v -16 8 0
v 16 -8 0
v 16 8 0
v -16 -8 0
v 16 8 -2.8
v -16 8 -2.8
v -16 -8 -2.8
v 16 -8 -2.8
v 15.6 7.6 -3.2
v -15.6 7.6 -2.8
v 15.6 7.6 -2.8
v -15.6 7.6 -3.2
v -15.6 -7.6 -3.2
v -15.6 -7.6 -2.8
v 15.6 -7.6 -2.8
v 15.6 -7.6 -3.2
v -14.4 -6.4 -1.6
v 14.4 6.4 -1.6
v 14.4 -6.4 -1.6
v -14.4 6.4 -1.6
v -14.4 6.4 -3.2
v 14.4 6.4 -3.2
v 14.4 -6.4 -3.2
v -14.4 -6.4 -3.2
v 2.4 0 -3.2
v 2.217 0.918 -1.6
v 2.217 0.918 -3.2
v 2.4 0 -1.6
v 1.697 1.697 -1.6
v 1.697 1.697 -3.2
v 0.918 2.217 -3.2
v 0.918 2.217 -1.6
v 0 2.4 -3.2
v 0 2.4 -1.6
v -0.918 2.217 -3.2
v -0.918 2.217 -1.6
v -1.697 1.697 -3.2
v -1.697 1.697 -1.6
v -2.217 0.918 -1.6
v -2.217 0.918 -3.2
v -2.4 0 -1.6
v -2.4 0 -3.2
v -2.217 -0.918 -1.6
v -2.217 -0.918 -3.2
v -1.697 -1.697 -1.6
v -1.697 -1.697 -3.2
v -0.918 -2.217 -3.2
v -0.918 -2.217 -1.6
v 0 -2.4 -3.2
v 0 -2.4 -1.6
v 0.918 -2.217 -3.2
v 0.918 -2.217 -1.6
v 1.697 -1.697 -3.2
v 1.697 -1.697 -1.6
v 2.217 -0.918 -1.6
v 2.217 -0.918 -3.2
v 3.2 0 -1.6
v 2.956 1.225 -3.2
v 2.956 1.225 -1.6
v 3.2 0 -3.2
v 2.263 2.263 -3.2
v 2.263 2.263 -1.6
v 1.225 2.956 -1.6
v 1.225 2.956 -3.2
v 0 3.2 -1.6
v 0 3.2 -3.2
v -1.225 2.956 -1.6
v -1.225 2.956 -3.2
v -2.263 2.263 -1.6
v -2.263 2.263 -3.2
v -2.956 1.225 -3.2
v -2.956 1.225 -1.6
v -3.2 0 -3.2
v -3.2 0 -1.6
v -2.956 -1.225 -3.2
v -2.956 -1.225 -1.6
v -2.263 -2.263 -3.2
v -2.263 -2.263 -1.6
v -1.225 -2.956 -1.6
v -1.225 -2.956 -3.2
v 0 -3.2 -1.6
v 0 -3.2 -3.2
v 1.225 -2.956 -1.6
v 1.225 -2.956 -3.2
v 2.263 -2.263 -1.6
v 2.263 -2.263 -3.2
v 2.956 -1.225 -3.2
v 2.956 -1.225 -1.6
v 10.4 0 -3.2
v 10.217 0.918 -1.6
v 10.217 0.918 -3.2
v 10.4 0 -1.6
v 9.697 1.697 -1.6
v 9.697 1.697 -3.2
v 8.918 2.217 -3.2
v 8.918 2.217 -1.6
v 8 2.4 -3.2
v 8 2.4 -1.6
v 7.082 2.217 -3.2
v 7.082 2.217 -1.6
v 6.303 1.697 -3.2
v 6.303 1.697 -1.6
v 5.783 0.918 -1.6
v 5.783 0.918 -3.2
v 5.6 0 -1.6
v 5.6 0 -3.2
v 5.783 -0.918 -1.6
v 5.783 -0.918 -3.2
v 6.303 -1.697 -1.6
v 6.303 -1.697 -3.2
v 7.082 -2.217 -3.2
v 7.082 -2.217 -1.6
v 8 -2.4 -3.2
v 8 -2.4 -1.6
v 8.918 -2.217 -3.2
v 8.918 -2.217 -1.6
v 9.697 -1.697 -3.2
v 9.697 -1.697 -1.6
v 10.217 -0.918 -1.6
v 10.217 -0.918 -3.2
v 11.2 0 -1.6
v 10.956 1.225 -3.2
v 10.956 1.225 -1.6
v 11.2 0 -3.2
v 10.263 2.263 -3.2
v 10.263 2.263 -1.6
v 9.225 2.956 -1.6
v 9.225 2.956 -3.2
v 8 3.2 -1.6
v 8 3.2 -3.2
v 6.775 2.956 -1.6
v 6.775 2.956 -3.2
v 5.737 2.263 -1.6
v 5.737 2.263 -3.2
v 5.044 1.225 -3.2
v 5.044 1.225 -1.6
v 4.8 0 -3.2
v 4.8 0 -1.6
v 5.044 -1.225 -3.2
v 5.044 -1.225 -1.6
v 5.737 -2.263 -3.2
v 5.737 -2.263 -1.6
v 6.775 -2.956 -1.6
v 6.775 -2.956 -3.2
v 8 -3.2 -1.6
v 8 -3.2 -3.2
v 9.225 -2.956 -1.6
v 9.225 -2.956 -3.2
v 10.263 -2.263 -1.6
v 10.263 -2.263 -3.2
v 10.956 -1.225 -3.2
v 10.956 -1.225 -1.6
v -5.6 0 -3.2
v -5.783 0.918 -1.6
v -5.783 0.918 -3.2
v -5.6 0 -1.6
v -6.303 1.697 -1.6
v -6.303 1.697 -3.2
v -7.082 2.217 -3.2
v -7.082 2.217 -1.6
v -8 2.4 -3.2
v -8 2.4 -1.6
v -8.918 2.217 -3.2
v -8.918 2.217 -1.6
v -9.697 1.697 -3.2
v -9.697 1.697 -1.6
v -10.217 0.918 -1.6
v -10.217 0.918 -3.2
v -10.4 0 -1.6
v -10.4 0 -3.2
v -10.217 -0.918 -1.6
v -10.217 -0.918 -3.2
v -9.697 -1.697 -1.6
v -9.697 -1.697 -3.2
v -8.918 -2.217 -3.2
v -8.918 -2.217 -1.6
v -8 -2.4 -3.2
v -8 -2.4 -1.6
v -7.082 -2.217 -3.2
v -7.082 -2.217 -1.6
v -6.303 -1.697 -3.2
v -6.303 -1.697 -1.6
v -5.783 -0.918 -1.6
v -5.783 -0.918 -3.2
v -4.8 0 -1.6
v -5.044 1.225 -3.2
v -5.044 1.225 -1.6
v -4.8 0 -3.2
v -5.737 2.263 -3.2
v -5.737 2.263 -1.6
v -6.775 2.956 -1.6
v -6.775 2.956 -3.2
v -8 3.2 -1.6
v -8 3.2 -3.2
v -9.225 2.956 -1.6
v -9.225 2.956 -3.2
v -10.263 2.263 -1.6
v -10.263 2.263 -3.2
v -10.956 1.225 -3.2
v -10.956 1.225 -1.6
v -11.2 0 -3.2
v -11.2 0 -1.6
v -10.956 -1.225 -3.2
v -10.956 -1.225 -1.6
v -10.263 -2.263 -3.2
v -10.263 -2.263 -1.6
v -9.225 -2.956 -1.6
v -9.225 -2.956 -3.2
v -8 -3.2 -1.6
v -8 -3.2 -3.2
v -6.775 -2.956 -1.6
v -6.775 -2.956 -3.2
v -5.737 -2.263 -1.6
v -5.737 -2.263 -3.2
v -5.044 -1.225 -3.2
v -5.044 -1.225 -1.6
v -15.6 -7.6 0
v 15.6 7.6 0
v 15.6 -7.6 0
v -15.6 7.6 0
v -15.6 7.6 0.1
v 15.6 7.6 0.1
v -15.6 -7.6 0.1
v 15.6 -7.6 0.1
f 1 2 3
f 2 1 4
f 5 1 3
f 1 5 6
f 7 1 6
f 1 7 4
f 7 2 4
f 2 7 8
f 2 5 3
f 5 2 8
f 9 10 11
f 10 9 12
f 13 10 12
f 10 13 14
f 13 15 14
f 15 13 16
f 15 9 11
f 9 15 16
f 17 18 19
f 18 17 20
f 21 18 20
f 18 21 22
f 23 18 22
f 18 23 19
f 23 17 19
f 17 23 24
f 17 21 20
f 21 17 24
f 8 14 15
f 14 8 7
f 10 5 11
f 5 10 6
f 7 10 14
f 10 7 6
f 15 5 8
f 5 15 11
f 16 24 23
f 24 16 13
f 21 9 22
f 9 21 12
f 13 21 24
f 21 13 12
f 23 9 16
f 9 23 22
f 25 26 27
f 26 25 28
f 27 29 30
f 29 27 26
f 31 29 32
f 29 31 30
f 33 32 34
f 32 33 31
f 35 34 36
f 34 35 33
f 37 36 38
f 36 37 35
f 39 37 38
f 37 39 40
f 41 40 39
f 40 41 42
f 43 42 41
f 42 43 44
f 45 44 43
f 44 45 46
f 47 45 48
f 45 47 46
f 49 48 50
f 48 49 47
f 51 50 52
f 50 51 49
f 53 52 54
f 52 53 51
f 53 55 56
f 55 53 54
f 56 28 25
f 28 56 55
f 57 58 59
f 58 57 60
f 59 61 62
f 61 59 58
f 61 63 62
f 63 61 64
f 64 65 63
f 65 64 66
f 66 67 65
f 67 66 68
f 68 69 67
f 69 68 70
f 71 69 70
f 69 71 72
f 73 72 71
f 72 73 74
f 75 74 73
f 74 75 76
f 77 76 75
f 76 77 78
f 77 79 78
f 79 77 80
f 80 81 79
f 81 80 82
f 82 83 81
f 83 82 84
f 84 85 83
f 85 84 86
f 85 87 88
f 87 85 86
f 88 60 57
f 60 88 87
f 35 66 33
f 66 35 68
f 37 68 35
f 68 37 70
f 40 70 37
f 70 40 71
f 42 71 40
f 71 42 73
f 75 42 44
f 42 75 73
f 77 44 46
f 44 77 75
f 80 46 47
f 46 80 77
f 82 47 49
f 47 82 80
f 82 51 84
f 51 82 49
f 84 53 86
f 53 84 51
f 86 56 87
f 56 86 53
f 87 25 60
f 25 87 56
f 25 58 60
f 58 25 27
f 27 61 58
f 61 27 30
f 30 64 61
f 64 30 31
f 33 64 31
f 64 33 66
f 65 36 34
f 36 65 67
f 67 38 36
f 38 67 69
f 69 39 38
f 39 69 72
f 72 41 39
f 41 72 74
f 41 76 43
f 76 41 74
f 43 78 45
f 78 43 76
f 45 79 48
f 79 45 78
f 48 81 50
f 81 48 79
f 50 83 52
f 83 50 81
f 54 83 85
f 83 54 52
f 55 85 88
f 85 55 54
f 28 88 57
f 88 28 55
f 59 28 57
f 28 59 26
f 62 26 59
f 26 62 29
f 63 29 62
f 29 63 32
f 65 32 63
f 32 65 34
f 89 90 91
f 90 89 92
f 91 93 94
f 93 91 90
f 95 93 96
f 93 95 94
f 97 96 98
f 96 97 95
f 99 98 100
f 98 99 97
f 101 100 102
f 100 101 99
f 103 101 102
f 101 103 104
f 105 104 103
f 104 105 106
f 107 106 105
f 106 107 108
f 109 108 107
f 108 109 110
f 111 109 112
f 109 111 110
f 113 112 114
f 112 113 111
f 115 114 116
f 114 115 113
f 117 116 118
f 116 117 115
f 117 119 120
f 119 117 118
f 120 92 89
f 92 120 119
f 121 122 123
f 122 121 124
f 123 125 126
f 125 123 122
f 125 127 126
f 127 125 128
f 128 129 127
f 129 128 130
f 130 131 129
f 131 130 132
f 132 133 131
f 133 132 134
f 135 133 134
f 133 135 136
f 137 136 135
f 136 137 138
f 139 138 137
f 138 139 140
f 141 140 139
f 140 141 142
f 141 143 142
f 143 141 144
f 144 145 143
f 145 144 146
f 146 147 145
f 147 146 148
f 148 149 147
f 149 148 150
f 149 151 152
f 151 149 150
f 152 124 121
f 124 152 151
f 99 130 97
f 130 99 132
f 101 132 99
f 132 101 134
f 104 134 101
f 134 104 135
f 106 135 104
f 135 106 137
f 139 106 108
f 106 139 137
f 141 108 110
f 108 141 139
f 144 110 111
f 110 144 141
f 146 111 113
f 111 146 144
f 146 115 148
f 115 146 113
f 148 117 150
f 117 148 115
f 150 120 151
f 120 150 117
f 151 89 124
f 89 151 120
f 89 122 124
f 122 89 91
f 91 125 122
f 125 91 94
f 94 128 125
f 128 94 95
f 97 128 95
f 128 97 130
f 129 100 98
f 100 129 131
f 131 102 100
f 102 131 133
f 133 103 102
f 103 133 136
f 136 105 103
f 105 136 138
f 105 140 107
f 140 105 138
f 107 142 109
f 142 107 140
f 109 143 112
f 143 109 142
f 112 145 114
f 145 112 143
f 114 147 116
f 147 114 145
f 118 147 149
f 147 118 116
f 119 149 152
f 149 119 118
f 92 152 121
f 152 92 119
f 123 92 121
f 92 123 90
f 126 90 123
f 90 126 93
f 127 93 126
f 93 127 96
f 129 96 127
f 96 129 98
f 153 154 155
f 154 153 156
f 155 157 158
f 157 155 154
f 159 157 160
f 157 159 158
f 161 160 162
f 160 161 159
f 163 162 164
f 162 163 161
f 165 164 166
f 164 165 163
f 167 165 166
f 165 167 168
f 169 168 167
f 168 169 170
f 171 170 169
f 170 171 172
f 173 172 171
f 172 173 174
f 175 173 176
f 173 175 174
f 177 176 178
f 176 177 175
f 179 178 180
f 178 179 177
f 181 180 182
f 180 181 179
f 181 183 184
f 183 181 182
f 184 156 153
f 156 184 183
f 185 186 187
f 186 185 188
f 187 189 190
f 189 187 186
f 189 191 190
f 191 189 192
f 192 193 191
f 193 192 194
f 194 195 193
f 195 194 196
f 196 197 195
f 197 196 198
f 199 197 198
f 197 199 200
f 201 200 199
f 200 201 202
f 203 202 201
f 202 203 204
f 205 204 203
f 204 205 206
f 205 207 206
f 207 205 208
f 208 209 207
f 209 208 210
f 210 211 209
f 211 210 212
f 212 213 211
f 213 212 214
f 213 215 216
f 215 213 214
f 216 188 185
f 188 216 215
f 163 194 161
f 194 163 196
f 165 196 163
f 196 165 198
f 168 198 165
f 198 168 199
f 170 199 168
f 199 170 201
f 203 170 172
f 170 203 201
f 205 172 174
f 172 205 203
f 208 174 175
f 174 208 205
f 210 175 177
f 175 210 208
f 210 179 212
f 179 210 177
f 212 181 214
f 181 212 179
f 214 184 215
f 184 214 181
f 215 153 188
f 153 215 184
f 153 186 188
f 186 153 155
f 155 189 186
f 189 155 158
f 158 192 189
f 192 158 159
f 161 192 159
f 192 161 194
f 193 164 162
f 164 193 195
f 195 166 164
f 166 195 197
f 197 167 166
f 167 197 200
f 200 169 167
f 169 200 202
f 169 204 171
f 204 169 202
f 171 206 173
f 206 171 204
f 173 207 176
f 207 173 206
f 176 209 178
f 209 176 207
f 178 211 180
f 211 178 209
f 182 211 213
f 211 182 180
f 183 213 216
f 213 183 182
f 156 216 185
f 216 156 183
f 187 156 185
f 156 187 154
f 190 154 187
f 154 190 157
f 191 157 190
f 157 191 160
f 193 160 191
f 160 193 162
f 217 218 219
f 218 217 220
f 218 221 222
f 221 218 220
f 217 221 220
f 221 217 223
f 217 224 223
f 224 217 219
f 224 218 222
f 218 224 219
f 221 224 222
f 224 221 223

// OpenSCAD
// file: ../p/4-4ring3.scad
use <../lib.scad>
$fa=1; $fs=0.2;
function ldraw_lib__4_4ring3(realsolid=false) = [
// 0 Ring  3 x 1.0
// 0 Name: 4-4ring3.dat
// 0 Author: James Jessiman
// 0 !LDRAW_ORG Primitive UPDATE 2009-01
// 0 !LICENSE Licensed under CC BY 2.0 and CC BY 4.0 : see CAreadme.txt
// 
// 0 BFC CERTIFY CCW
  [0,"BFC","CERTIFY"],
  [0,"BFC","CCW"],
// 
// 0 !HISTORY 1998-12-15 [PTadmin] Official Update 1998-10
// 0 !HISTORY 2002-04-05 [hafhead] Added BFC statement
// 0 !HISTORY 2002-04-25 [PTadmin] Official Update 2002-02
// 0 !HISTORY 2007-06-24 [PTadmin] Header formatted for Contributor Agreement
// 0 !HISTORY 2008-07-01 [PTadmin] Official Update 2008-01
// 0 !HISTORY 2008-08-26 [cwdee] Switch polygon winding and rename
// 0 !HISTORY 2009-05-02 [PTadmin] Official Update 2009-01
// 
// 
// 4 16 -1.5308 0 3.6956 -1.1481 0 2.7717 0 0 3 0 0 4
  [4,16,-1.5308,0,3.6956,-1.1481,0,2.7717,0,0,3,0,0,4],
// 4 16 -2.8284 0 2.8284 -2.1213 0 2.1213 -1.1481 0 2.7717 -1.5308 0 3.6956
  [4,16,-2.8284,0,2.8284,-2.1213,0,2.1213,-1.1481,0,2.7717,-1.5308,0,3.6956],
// 4 16 -3.6956 0 1.5308 -2.7717 0 1.1481 -2.1213 0 2.1213 -2.8284 0 2.8284
  [4,16,-3.6956,0,1.5308,-2.7717,0,1.1481,-2.1213,0,2.1213,-2.8284,0,2.8284],
// 4 16 -4 0 0 -3 0 0 -2.7717 0 1.1481 -3.6956 0 1.5308
  [4,16,-4,0,0,-3,0,0,-2.7717,0,1.1481,-3.6956,0,1.5308],
// 4 16 -3.6956 0 -1.5308 -2.7717 0 -1.1481 -3 0 0 -4 0 0
  [4,16,-3.6956,0,-1.5308,-2.7717,0,-1.1481,-3,0,0,-4,0,0],
// 4 16 -2.8284 0 -2.8284 -2.1213 0 -2.1213 -2.7717 0 -1.1481 -3.6956 0 -1.5308
  [4,16,-2.8284,0,-2.8284,-2.1213,0,-2.1213,-2.7717,0,-1.1481,-3.6956,0,-1.5308],
// 4 16 -1.5308 0 -3.6956 -1.1481 0 -2.7717 -2.1213 0 -2.1213 -2.8284 0 -2.8284
  [4,16,-1.5308,0,-3.6956,-1.1481,0,-2.7717,-2.1213,0,-2.1213,-2.8284,0,-2.8284],
// 4 16 0 0 -4 0 0 -3 -1.1481 0 -2.7717 -1.5308 0 -3.6956
  [4,16,0,0,-4,0,0,-3,-1.1481,0,-2.7717,-1.5308,0,-3.6956],
// 4 16 1.5308 0 -3.6956 1.1481 0 -2.7717 0 0 -3 0 0 -4
  [4,16,1.5308,0,-3.6956,1.1481,0,-2.7717,0,0,-3,0,0,-4],
// 4 16 2.8284 0 -2.8284 2.1213 0 -2.1213 1.1481 0 -2.7717 1.5308 0 -3.6956
  [4,16,2.8284,0,-2.8284,2.1213,0,-2.1213,1.1481,0,-2.7717,1.5308,0,-3.6956],
// 4 16 3.6956 0 -1.5308 2.7717 0 -1.1481 2.1213 0 -2.1213 2.8284 0 -2.8284
  [4,16,3.6956,0,-1.5308,2.7717,0,-1.1481,2.1213,0,-2.1213,2.8284,0,-2.8284],
// 4 16 4 0 0 3 0 0 2.7717 0 -1.1481 3.6956 0 -1.5308
  [4,16,4,0,0,3,0,0,2.7717,0,-1.1481,3.6956,0,-1.5308],
// 4 16 3.6956 0 1.5308 2.7717 0 1.1481 3 0 0 4 0 0
  [4,16,3.6956,0,1.5308,2.7717,0,1.1481,3,0,0,4,0,0],
// 4 16 2.8284 0 2.8284 2.1213 0 2.1213 2.7717 0 1.1481 3.6956 0 1.5308
  [4,16,2.8284,0,2.8284,2.1213,0,2.1213,2.7717,0,1.1481,3.6956,0,1.5308],
// 4 16 1.5308 0 3.6956 1.1481 0 2.7717 2.1213 0 2.1213 2.8284 0 2.8284
  [4,16,1.5308,0,3.6956,1.1481,0,2.7717,2.1213,0,2.1213,2.8284,0,2.8284],
// 4 16 0 0 4 0 0 3 1.1481 0 2.7717 1.5308 0 3.6956
  [4,16,0,0,4,0,0,3,1.1481,0,2.7717,1.5308,0,3.6956],
// 0
];
module ldraw_lib__4_4ring3(step=0, col=false, unit=2/5, alt=false, line=0.2, solid=!$preview)
    makepoly(ldraw_lib__4_4ring3(solid), step=step, col=col, unit=unit, alt=alt, line=line, solid=solid);
ldraw_lib__4_4ring3(line=0.2);
// file: ../p/4-4edge.scad
use <../lib.scad>
function ldraw_lib__4_4edge() = [
// 0 Circle 1.0
// 0 Name: 4-4edge.dat
// 0 Author: James Jessiman
// 0 !LDRAW_ORG Primitive UPDATE 2017-01
// 0 !LICENSE Licensed under CC BY 2.0 and CC BY 4.0 : see CAreadme.txt
// 
// 0 BFC CERTIFY CCW
  [0,"BFC","CERTIFY"],
  [0,"BFC","CCW"],
// 
// 0 !HISTORY 1998-12-15 [PTadmin] Official Update 1998-10
// 0 !HISTORY 2005-12-28 [PTadmin] Official Update 2005-01
// 0 !HISTORY 2007-06-24 [PTadmin] Header formatted for Contributor Agreement
// 0 !HISTORY 2008-07-01 [PTadmin] Official Update 2008-01
// 0 !HISTORY 2017-01-15 [Steffen] BFCed
// 0 !HISTORY 2017-12-30 [PTadmin] Official Update 2017-01
// 
// 
// 2 24 1 0 0 0.9239 0 0.3827
  [2,24,1,0,0,0.9239,0,0.3827],
// 2 24 0.9239 0 0.3827 0.7071 0 0.7071
  [2,24,0.9239,0,0.3827,0.7071,0,0.7071],
// 2 24 0.7071 0 0.7071 0.3827 0 0.9239
  [2,24,0.7071,0,0.7071,0.3827,0,0.9239],
// 2 24 0.3827 0 0.9239 0 0 1
  [2,24,0.3827,0,0.9239,0,0,1],
// 2 24 0 0 1 -0.3827 0 0.9239
  [2,24,0,0,1,-0.3827,0,0.9239],
// 2 24 -0.3827 0 0.9239 -0.7071 0 0.7071
  [2,24,-0.3827,0,0.9239,-0.7071,0,0.7071],
// 2 24 -0.7071 0 0.7071 -0.9239 0 0.3827
  [2,24,-0.7071,0,0.7071,-0.9239,0,0.3827],
// 2 24 -0.9239 0 0.3827 -1 0 -0
  [2,24,-0.9239,0,0.3827,-1,0,-0],
// 2 24 -1 0 -0 -0.9239 0 -0.3827
  [2,24,-1,0,-0,-0.9239,0,-0.3827],
// 2 24 -0.9239 0 -0.3827 -0.7071 0 -0.7071
  [2,24,-0.9239,0,-0.3827,-0.7071,0,-0.7071],
// 2 24 -0.7071 0 -0.7071 -0.3827 0 -0.9239
  [2,24,-0.7071,0,-0.7071,-0.3827,0,-0.9239],
// 2 24 -0.3827 0 -0.9239 0 0 -1
  [2,24,-0.3827,0,-0.9239,0,0,-1],
// 2 24 0 0 -1 0.3827 0 -0.9239
  [2,24,0,0,-1,0.3827,0,-0.9239],
// 2 24 0.3827 0 -0.9239 0.7071 0 -0.7071
  [2,24,0.3827,0,-0.9239,0.7071,0,-0.7071],
// 2 24 0.7071 0 -0.7071 0.9239 0 -0.3827
  [2,24,0.7071,0,-0.7071,0.9239,0,-0.3827],
// 2 24 0.9239 0 -0.3827 1 0 0
  [2,24,0.9239,0,-0.3827,1,0,0],
];
module ldraw_lib__4_4edge(step=0, col=false, unit=2/5, alt=false, line=0.2, solid=!$preview)
    makepoly(ldraw_lib__4_4edge(), step=step, col=col, unit=unit, alt=alt, line=line, solid=solid);
ldraw_lib__4_4edge(line=0.2);
// file: ../p/4-4cyli.scad
use <../lib.scad>
$fa=1; $fs=0.2;
function ldraw_lib__4_4cyli(realsolid=false) = [
// 0 Cylinder 1.0
// 0 Name: 4-4cyli.dat
// 0 Author: James Jessiman
// 0 !LDRAW_ORG Primitive UPDATE 2005-01
// 0 !LICENSE Licensed under CC BY 2.0 and CC BY 4.0 : see CAreadme.txt
// 
// 0 BFC CERTIFY CCW
  [0,"BFC","CERTIFY"],
  [0,"BFC","CCW"],
// 
// 0 !HISTORY 1998-12-15 [PTadmin] Official Update 1998-10
// 0 !HISTORY 2002-03-23 [sbliss] Added BFC statement; merged headers from files in distributions LDraw 0.27 and Complete.
// 0 !HISTORY 2002-04-25 [PTadmin] Official Update 2002-02
// 0 !HISTORY 2004-12-14 [guyvivan] BFC CCW
// 0 !HISTORY 2005-12-28 [PTadmin] Official Update 2005-01
// 0 !HISTORY 2007-06-24 [PTadmin] Header formatted for Contributor Agreement
// 0 !HISTORY 2008-07-01 [PTadmin] Official Update 2008-01
// 
// 
// 4 16 1 1 0 0.9239 1 0.3827 0.9239 0 0.3827 1 0 0
  [4,16,1,1,0,0.9239,1,0.3827,0.9239,0,0.3827,1,0,0],
// 5 24 1 0 0 1 1 0 0.9239 0 0.3827 0.9239 0 -0.3827
  [5,24,1,0,0,1,1,0,0.9239,0,0.3827,0.9239,0,-0.3827],
// 4 16 0.9239 1 0.3827 0.7071 1 0.7071 0.7071 0 0.7071 0.9239 0 0.3827
  [4,16,0.9239,1,0.3827,0.7071,1,0.7071,0.7071,0,0.7071,0.9239,0,0.3827],
// 5 24 0.9239 0 0.3827 0.9239 1 0.3827 0.7071 0 0.7071 1 0 0
  [5,24,0.9239,0,0.3827,0.9239,1,0.3827,0.7071,0,0.7071,1,0,0],
// 4 16 0.7071 1 0.7071 0.3827 1 0.9239 0.3827 0 0.9239 0.7071 0 0.7071
  [4,16,0.7071,1,0.7071,0.3827,1,0.9239,0.3827,0,0.9239,0.7071,0,0.7071],
// 5 24 0.7071 0 0.7071 0.7071 1 0.7071 0.3827 0 0.9239 0.9239 0 0.3827
  [5,24,0.7071,0,0.7071,0.7071,1,0.7071,0.3827,0,0.9239,0.9239,0,0.3827],
// 4 16 0.3827 1 0.9239 0 1 1 0 0 1 0.3827 0 0.9239
  [4,16,0.3827,1,0.9239,0,1,1,0,0,1,0.3827,0,0.9239],
// 5 24 0.3827 0 0.9239 0.3827 1 0.9239 0 0 1 0.7071 0 0.7071
  [5,24,0.3827,0,0.9239,0.3827,1,0.9239,0,0,1,0.7071,0,0.7071],
// 4 16 0 1 1 -0.3827 1 0.9239 -0.3827 0 0.9239 0 0 1
  [4,16,0,1,1,-0.3827,1,0.9239,-0.3827,0,0.9239,0,0,1],
// 5 24 0 0 1 0 1 1 -0.3827 0 0.9239 0.3827 0 0.9239
  [5,24,0,0,1,0,1,1,-0.3827,0,0.9239,0.3827,0,0.9239],
// 4 16 -0.3827 1 0.9239 -0.7071 1 0.7071 -0.7071 0 0.7071 -0.3827 0 0.9239
  [4,16,-0.3827,1,0.9239,-0.7071,1,0.7071,-0.7071,0,0.7071,-0.3827,0,0.9239],
// 5 24 -0.3827 0 0.9239 -0.3827 1 0.9239 -0.7071 0 0.7071 0 0 1
  [5,24,-0.3827,0,0.9239,-0.3827,1,0.9239,-0.7071,0,0.7071,0,0,1],
// 4 16 -0.7071 1 0.7071 -0.9239 1 0.3827 -0.9239 0 0.3827 -0.7071 0 0.7071
  [4,16,-0.7071,1,0.7071,-0.9239,1,0.3827,-0.9239,0,0.3827,-0.7071,0,0.7071],
// 5 24 -0.7071 0 0.7071 -0.7071 1 0.7071 -0.9239 0 0.3827 -0.3827 0 0.9239
  [5,24,-0.7071,0,0.7071,-0.7071,1,0.7071,-0.9239,0,0.3827,-0.3827,0,0.9239],
// 4 16 -0.9239 1 0.3827 -1 1 0 -1 0 0 -0.9239 0 0.3827
  [4,16,-0.9239,1,0.3827,-1,1,0,-1,0,0,-0.9239,0,0.3827],
// 5 24 -0.9239 0 0.3827 -0.9239 1 0.3827 -1 0 0 -0.7071 0 0.7071
  [5,24,-0.9239,0,0.3827,-0.9239,1,0.3827,-1,0,0,-0.7071,0,0.7071],
// 4 16 -1 1 0 -0.9239 1 -0.3827 -0.9239 0 -0.3827 -1 0 0
  [4,16,-1,1,0,-0.9239,1,-0.3827,-0.9239,0,-0.3827,-1,0,0],
// 5 24 -1 0 0 -1 1 0 -0.9239 0 -0.3827 -0.9239 0 0.3827
  [5,24,-1,0,0,-1,1,0,-0.9239,0,-0.3827,-0.9239,0,0.3827],
// 4 16 -0.9239 1 -0.3827 -0.7071 1 -0.7071 -0.7071 0 -0.7071 -0.9239 0 -0.3827
  [4,16,-0.9239,1,-0.3827,-0.7071,1,-0.7071,-0.7071,0,-0.7071,-0.9239,0,-0.3827],
// 5 24 -0.9239 0 -0.3827 -0.9239 1 -0.3827 -0.7071 0 -0.7071 -1 0 0
  [5,24,-0.9239,0,-0.3827,-0.9239,1,-0.3827,-0.7071,0,-0.7071,-1,0,0],
// 4 16 -0.7071 1 -0.7071 -0.3827 1 -0.9239 -0.3827 0 -0.9239 -0.7071 0 -0.7071
  [4,16,-0.7071,1,-0.7071,-0.3827,1,-0.9239,-0.3827,0,-0.9239,-0.7071,0,-0.7071],
// 5 24 -0.7071 0 -0.7071 -0.7071 1 -0.7071 -0.3827 0 -0.9239 -0.9239 0 -0.3827
  [5,24,-0.7071,0,-0.7071,-0.7071,1,-0.7071,-0.3827,0,-0.9239,-0.9239,0,-0.3827],
// 4 16 -0.3827 1 -0.9239 0 1 -1 0 0 -1 -0.3827 0 -0.9239
  [4,16,-0.3827,1,-0.9239,0,1,-1,0,0,-1,-0.3827,0,-0.9239],
// 5 24 -0.3827 0 -0.9239 -0.3827 1 -0.9239 0 0 -1 -0.7071 0 -0.7071
  [5,24,-0.3827,0,-0.9239,-0.3827,1,-0.9239,0,0,-1,-0.7071,0,-0.7071],
// 4 16 0 1 -1 0.3827 1 -0.9239 0.3827 0 -0.9239 0 0 -1
  [4,16,0,1,-1,0.3827,1,-0.9239,0.3827,0,-0.9239,0,0,-1],
// 5 24 0 0 -1 0 1 -1 0.3827 0 -0.9239 -0.3827 0 -0.9239
  [5,24,0,0,-1,0,1,-1,0.3827,0,-0.9239,-0.3827,0,-0.9239],
// 4 16 0.3827 1 -0.9239 0.7071 1 -0.7071 0.7071 0 -0.7071 0.3827 0 -0.9239
  [4,16,0.3827,1,-0.9239,0.7071,1,-0.7071,0.7071,0,-0.7071,0.3827,0,-0.9239],
// 5 24 0.3827 0 -0.9239 0.3827 1 -0.9239 0.7071 0 -0.7071 0 0 -1
  [5,24,0.3827,0,-0.9239,0.3827,1,-0.9239,0.7071,0,-0.7071,0,0,-1],
// 4 16 0.7071 1 -0.7071 0.9239 1 -0.3827 0.9239 0 -0.3827 0.7071 0 -0.7071
  [4,16,0.7071,1,-0.7071,0.9239,1,-0.3827,0.9239,0,-0.3827,0.7071,0,-0.7071],
// 5 24 0.7071 0 -0.7071 0.7071 1 -0.7071 0.9239 0 -0.3827 0.3827 0 -0.9239
  [5,24,0.7071,0,-0.7071,0.7071,1,-0.7071,0.9239,0,-0.3827,0.3827,0,-0.9239],
// 4 16 0.9239 1 -0.3827 1 1 0 1 0 0 0.9239 0 -0.3827
  [4,16,0.9239,1,-0.3827,1,1,0,1,0,0,0.9239,0,-0.3827],
// 5 24 0.9239 0 -0.3827 0.9239 1 -0.3827 1 0 0 0.7071 0 -0.7071
  [5,24,0.9239,0,-0.3827,0.9239,1,-0.3827,1,0,0,0.7071,0,-0.7071],
// 0
];
module ldraw_lib__4_4cyli(step=0, col=false, unit=2/5, alt=false, line=0.2, solid=!$preview)
    makepoly(ldraw_lib__4_4cyli(solid), step=step, col=col, unit=unit, alt=alt, line=line, solid=solid);
ldraw_lib__4_4cyli(line=0.2);
// file: ../p/stud4.scad
use <../lib.scad>
use <4-4cyli.scad>
use <4-4edge.scad>
use <4-4ring3.scad>
function ldraw_lib__stud4() = [
// 0 Stud Tube Open
// 0 Name: stud4.dat
// 0 Author: James Jessiman
// 0 !LDRAW_ORG Primitive UPDATE 2009-02
// 0 !LICENSE Licensed under CC BY 4.0 : see CAreadme.txt
// 
// 0 BFC CERTIFY CCW
  [0,"BFC","CERTIFY"],
  [0,"BFC","CCW"],
// 
// 0 !HISTORY 1999-07-05 [PTadmin] Official Update 1999-05
// 0 !HISTORY 2002-04-04 [sbliss] Modified for BFC compliance
// 0 !HISTORY 2002-04-25 [PTadmin] Official Update 2002-02
// 0 !HISTORY 2007-06-24 [PTadmin] Header formatted for Contributor Agreement
// 0 !HISTORY 2008-07-01 [PTadmin] Official Update 2008-01
// 0 !HISTORY 2009-06-21 [cwdee] Update ring references to 4-4ring
// 0 !HISTORY 2009-09-03 [PTadmin] Official Update 2009-02
// 
// 
// 1 16 0 -4 0 6 0 0 0 1 0 0 0 6 4-4edge.dat
  [1,16,0,-4,0,6,0,0,0,1,0,0,0,6, ldraw_lib__4_4edge()],
// 1 16 0 -4 0 8 0 0 0 1 0 0 0 8 4-4edge.dat
  [1,16,0,-4,0,8,0,0,0,1,0,0,0,8, ldraw_lib__4_4edge()],
// 1 16 0 0 0 6 0 0 0 1 0 0 0 6 4-4edge.dat
  [1,16,0,0,0,6,0,0,0,1,0,0,0,6, ldraw_lib__4_4edge()],
// 1 16 0 0 0 8 0 0 0 1 0 0 0 8 4-4edge.dat
  [1,16,0,0,0,8,0,0,0,1,0,0,0,8, ldraw_lib__4_4edge()],
// 0 BFC INVERTNEXT
  [0,"BFC","INVERTNEXT"],
// 1 16 0 -4 0 6 0 0 0 4 0 0 0 6 4-4cyli.dat
  [1,16,0,-4,0,6,0,0,0,4,0,0,0,6, ldraw_lib__4_4cyli()],
// 1 16 0 -4 0 8 0 0 0 4 0 0 0 8 4-4cyli.dat
  [1,16,0,-4,0,8,0,0,0,4,0,0,0,8, ldraw_lib__4_4cyli()],
// 1 16 0 -4 0 2 0 0 0 1 0 0 0 2 4-4ring3.dat
  [1,16,0,-4,0,2,0,0,0,1,0,0,0,2, ldraw_lib__4_4ring3()],
  [-1,16,0,0,0,2,0,0,0,-1,0,0,0,2, ldraw_lib__4_4ring3()],
// 0
];
module ldraw_lib__stud4(step=0, col=false, unit=2/5, alt=false, line=0.2, solid=!$preview)
    makepoly(ldraw_lib__stud4(), step=step, col=col, unit=unit, alt=alt, line=line, solid=solid);
ldraw_lib__stud4(line=0.2);
// file: ../p/box5.scad
use <../lib.scad>
function ldraw_lib__box5() = [
// 0 Box with 5 Faces and All Edges
// 0 Name: box5.dat
// 0 Author: James Jessiman
// 0 !LDRAW_ORG Primitive UPDATE 2012-01
// 0 !LICENSE Licensed under CC BY 2.0 and CC BY 4.0 : see CAreadme.txt
// 
// 0 BFC CERTIFY CCW
  [0,"BFC","CERTIFY"],
  [0,"BFC","CCW"],
// 
// 0 !HISTORY 2002-04-03 [sbliss] Modified for BFC compliance
// 0 !HISTORY 2002-04-25 [PTadmin] Official Update 2002-02
// 0 !HISTORY 2007-06-24 [PTadmin] Header formatted for Contributor Agreement
// 0 !HISTORY 2008-07-01 [PTadmin] Official Update 2008-01
// 0 !HISTORY 2012-02-16 [Philo] Changed to CCW
// 0 !HISTORY 2012-03-30 [PTadmin] Official Update 2012-01
// 
// 
// 2 24 1 1 1 -1 1 1
  [2,24,1,1,1,-1,1,1],
// 2 24 -1 1 1 -1 1 -1
  [2,24,-1,1,1,-1,1,-1],
// 2 24 -1 1 -1 1 1 -1
  [2,24,-1,1,-1,1,1,-1],
// 2 24 1 1 -1 1 1 1
  [2,24,1,1,-1,1,1,1],
// 2 24 1 0 1 -1 0 1
  [2,24,1,0,1,-1,0,1],
// 2 24 -1 0 1 -1 0 -1
  [2,24,-1,0,1,-1,0,-1],
// 2 24 -1 0 -1 1 0 -1
  [2,24,-1,0,-1,1,0,-1],
// 2 24 1 0 -1 1 0 1
  [2,24,1,0,-1,1,0,1],
// 2 24 1 0 1 1 1 1
  [2,24,1,0,1,1,1,1],
// 2 24 -1 0 1 -1 1 1
  [2,24,-1,0,1,-1,1,1],
// 2 24 1 0 -1 1 1 -1
  [2,24,1,0,-1,1,1,-1],
// 2 24 -1 0 -1 -1 1 -1
  [2,24,-1,0,-1,-1,1,-1],
// 4 16 -1 1 1 1 1 1 1 1 -1 -1 1 -1
  [4,16,-1,1,1,1,1,1,1,1,-1,-1,1,-1],
// 4 16 -1 1 1 -1 0 1 1 0 1 1 1 1
  [4,16,-1,1,1,-1,0,1,1,0,1,1,1,1],
// 4 16 -1 1 -1 -1 0 -1 -1 0 1 -1 1 1
  [4,16,-1,1,-1,-1,0,-1,-1,0,1,-1,1,1],
// 4 16 1 1 -1 1 0 -1 -1 0 -1 -1 1 -1
  [4,16,1,1,-1,1,0,-1,-1,0,-1,-1,1,-1],
// 4 16 1 1 1 1 0 1 1 0 -1 1 1 -1
  [4,16,1,1,1,1,0,1,1,0,-1,1,1,-1],
];
makepoly(ldraw_lib__box5(), line=0.2);
// file: ../p/box4.scad
use <../lib.scad>
function ldraw_lib__box4() = [
// 0 Box with 4 Faces (2 Parallel Pairs) and All Edges
// 0 Name: box4.dat
// 0 Author: James Jessiman
// 0 !LDRAW_ORG Primitive UPDATE 2012-01
// 0 !LICENSE Licensed under CC BY 4.0 : see CAreadme.txt
// 
// 0 BFC CERTIFY CCW
  [0,"BFC","CERTIFY"],
  [0,"BFC","CCW"],
// 
// 0 !HISTORY 2002-04-03 [sbliss] Modified for BFC compliance
// 0 !HISTORY 2002-04-25 [PTadmin] Official Update 2002-02
// 0 !HISTORY 2007-06-24 [PTadmin] Header formatted for Contributor Agreement
// 0 !HISTORY 2008-07-01 [PTadmin] Official Update 2008-01
// 0 !HISTORY 2012-02-16 [Philo] Changed to CCW
// 0 !HISTORY 2012-03-30 [PTadmin] Official Update 2012-01
// 
// 
// 2 24 1 1 1 -1 1 1
  [2,24,1,1,1,-1,1,1],
// 2 24 -1 1 1 -1 1 -1
  [2,24,-1,1,1,-1,1,-1],
// 2 24 -1 1 -1 1 1 -1
  [2,24,-1,1,-1,1,1,-1],
// 2 24 1 1 -1 1 1 1
  [2,24,1,1,-1,1,1,1],
// 2 24 1 0 1 -1 0 1
  [2,24,1,0,1,-1,0,1],
// 2 24 -1 0 1 -1 0 -1
  [2,24,-1,0,1,-1,0,-1],
// 2 24 -1 0 -1 1 0 -1
  [2,24,-1,0,-1,1,0,-1],
// 2 24 1 0 -1 1 0 1
  [2,24,1,0,-1,1,0,1],
// 2 24 1 0 1 1 1 1
  [2,24,1,0,1,1,1,1],
// 2 24 -1 0 1 -1 1 1
  [2,24,-1,0,1,-1,1,1],
// 2 24 1 0 -1 1 1 -1
  [2,24,1,0,-1,1,1,-1],
// 2 24 -1 0 -1 -1 1 -1
  [2,24,-1,0,-1,-1,1,-1],
// 4 16 -1 1 1 -1 0 1 1 0 1 1 1 1
  [4,16,-1,1,1,-1,0,1,1,0,1,1,1,1],
// 4 16 -1 1 -1 -1 0 -1 -1 0 1 -1 1 1
  [4,16,-1,1,-1,-1,0,-1,-1,0,1,-1,1,1],
// 4 16 1 1 -1 1 0 -1 -1 0 -1 -1 1 -1
  [4,16,1,1,-1,1,0,-1,-1,0,-1,-1,1,-1],
// 4 16 1 1 1 1 0 1 1 0 -1 1 1 -1
  [4,16,1,1,1,1,0,1,1,0,-1,1,1,-1],
];
module ldraw_lib__box4(step=0, col=false, unit=2/5, alt=false, line=0.2, solid=!$preview)
    makepoly(ldraw_lib__box4(), step=step, col=col, unit=unit, alt=alt, line=line, solid=solid);
ldraw_lib__box4(line=0.2);
// file: s/87079s01.scad
use <../../lib.scad>
use <../../p/box4.scad>
use <../../p/box5.scad>
use <../../p/stud4.scad>
function ldraw_lib__s__87079s01() = [
// 0 ~Tile  2 x  4 with Groove without Top
// 0 Name: s\87079s01.dat
// 0 Author: Philippe Hurbain [Philo]
// 0 !LDRAW_ORG Subpart UPDATE 2012-03
// 0 !LICENSE Licensed under CC BY 4.0 : see CAreadme.txt
// 
// 0 BFC CERTIFY CCW
  [0,"BFC","CERTIFY"],
  [0,"BFC","CCW"],
// 
// 0 !HISTORY 2012-09-30 [Philo] Subparted from Tim Gould's original design
// 0 !HISTORY 2012-12-28 [PTadmin] Official Update 2012-03
// 
// 
// 1 16 0 0 0 40 0 0 0 7 0 0 0 20 box4.dat
  [1,16,0,0,0,40,0,0,0,7,0,0,0,20, ldraw_lib__box4()],
// 1 16 0 7 0 39 0 0 0 1 0 0 0 19 box4.dat
  [1,16,0,7,0,39,0,0,0,1,0,0,0,19, ldraw_lib__box4()],
// 0 BFC INVERTNEXT
  [0,"BFC","INVERTNEXT"],
// 1 16 0 8 0 -36 0 0 0 -4 0 0 0 16 box5.dat
  [1,16,0,8,0,-36,0,0,0,-4,0,0,0,16, ldraw_lib__box5()],
// 4 16 -40 7 -20 -39 7 -19 39 7 -19 40 7 -20
  [4,16,-40,7,-20,-39,7,-19,39,7,-19,40,7,-20],
// 4 16 40 7 20 39 7 19 -39 7 19 -40 7 20
  [4,16,40,7,20,39,7,19,-39,7,19,-40,7,20],
// 4 16 -40 7 -20 -40 7 20 -39 7 19 -39 7 -19
  [4,16,-40,7,-20,-40,7,20,-39,7,19,-39,7,-19],
// 4 16 40 7 20 40 7 -20 39 7 -19 39 7 19
  [4,16,40,7,20,40,7,-20,39,7,-19,39,7,19],
// 4 16 -39 8 -19 -36 8 -16 36 8 -16 39 8 -19
  [4,16,-39,8,-19,-36,8,-16,36,8,-16,39,8,-19],
// 4 16 39 8 19 36 8 16 -36 8 16 -39 8 19
  [4,16,39,8,19,36,8,16,-36,8,16,-39,8,19],
// 4 16 -39 8 -19 -39 8 19 -36 8 16 -36 8 -16
  [4,16,-39,8,-19,-39,8,19,-36,8,16,-36,8,-16],
// 4 16 39 8 19 39 8 -19 36 8 -16 36 8 16
  [4,16,39,8,19,39,8,-19,36,8,-16,36,8,16],
// 1 16 0 4 0 1 0 0 0 -1 0 0 0 1 stud4.dat
  [1,16,0,4,0,1,0,0,0,-1,0,0,0,1, ldraw_lib__stud4()],
// 1 16 20 4 0 1 0 0 0 -1 0 0 0 1 stud4.dat
  [1,16,20,4,0,1,0,0,0,-1,0,0,0,1, ldraw_lib__stud4()],
// 1 16 -20 4 0 1 0 0 0 -1 0 0 0 1 stud4.dat
  [1,16,-20,4,0,1,0,0,0,-1,0,0,0,1, ldraw_lib__stud4()],
];
module ldraw_lib__s__87079s01(step=0, col=false, unit=2/5, alt=false, line=0.2, solid=!$preview)
    makepoly(ldraw_lib__s__87079s01(), step=step, col=col, unit=unit, alt=alt, line=line, solid=solid);
ldraw_lib__s__87079s01(line=0.2);
// file: ../p/box5-12.scad
use <../lib.scad>
function ldraw_lib__box5_12() = [
// 0 Box with 5 Faces without Any Edges
// 0 Name: box5-12.dat
// 0 Author: Chris Dee [cwdee]
// 0 !LDRAW_ORG Primitive UPDATE 2009-02
// 0 !LICENSE Licensed under CC BY 2.0 and CC BY 4.0 : see CAreadme.txt
// 
// 0 BFC CERTIFY CCW
  [0,"BFC","CERTIFY"],
  [0,"BFC","CCW"],
// 
// 0 !HISTORY 2009-09-03 [PTadmin] Official Update 2009-02
// 
// 
// 4 16 1 1 1 1 1 -1 -1 1 -1 -1 1 1
  [4,16,1,1,1,1,1,-1,-1,1,-1,-1,1,1],
// 4 16 -1 0 1 1 0 1 1 1 1 -1 1 1
  [4,16,-1,0,1,1,0,1,1,1,1,-1,1,1],
// 4 16 -1 0 -1 -1 0 1 -1 1 1 -1 1 -1
  [4,16,-1,0,-1,-1,0,1,-1,1,1,-1,1,-1],
// 4 16 1 0 -1 -1 0 -1 -1 1 -1 1 1 -1
  [4,16,1,0,-1,-1,0,-1,-1,1,-1,1,1,-1],
// 4 16 1 0 1 1 0 -1 1 1 -1 1 1 1
  [4,16,1,0,1,1,0,-1,1,1,-1,1,1,1],
// 0
];
module ldraw_lib__box5_12(step=0, col=false, unit=2/5, alt=false, line=0.2, solid=!$preview)
    makepoly(ldraw_lib__box5_12(), step=step, col=col, unit=unit, alt=alt, line=line, solid=solid);
ldraw_lib__box5_12(line=0.2);
// file: 87079.scad
use <../lib.scad>
use <s/87079s01.scad>
function ldraw_lib__87079() = [
// 0 Tile  2 x  4 with Groove
// 0 Name: 87079.dat
// 0 Author: Tim Gould [timgould]
// 0 !LDRAW_ORG Part UPDATE 2012-03
// 0 !LICENSE Licensed under CC BY 4.0 : see CAreadme.txt
// 
// 0 BFC CERTIFY CCW
  [0,"BFC","CERTIFY"],
  [0,"BFC","CCW"],
// 
// 0 !HISTORY 2010-04-05 [PTadmin] Official Update 2010-01
// 0 !HISTORY 2012-09-30 [Philo] Subparted for patterns
// 0 !HISTORY 2012-12-28 [PTadmin] Official Update 2012-03
// 
// 
// 4 16 -40 0 -20 40 0 -20 40 0 20 -40 0 20
  [4,16,-40,0,-20,40,0,-20,40,0,20,-40,0,20],
// 1 16 0 0 0 1 0 0 0 1 0 0 0 1 s\87079s01.dat
  [1,16,0,0,0,1,0,0,0,1,0,0,0,1, ldraw_lib__s__87079s01()],
];
module ldraw_lib__87079(step=0, col=false, unit=2/5, alt=false, line=0.2, solid=!$preview)
    makepoly(ldraw_lib__87079(), step=step, col=col, unit=unit, alt=alt, line=line, solid=solid);
ldraw_lib__87079(line=0.2);
// file: 4620860l.scad
use <../lib.scad>
use <../p/box5-12.scad>
function ldraw_lib__4620860l() = [
// 0 Sticker  1.9 x  3.9 with Chrome Silver Mirror
// 0 Name: 4620860l.dat
// 0 Author: Takeshi Takahashi [RainbowDolphin]
// 0 !LDRAW_ORG Part UPDATE 2024-10
// 0 !LICENSE Licensed under CC BY 4.0 : see CAreadme.txt
// 
// 0 BFC CERTIFY CCW
  [0,"BFC","CERTIFY"],
  [0,"BFC","CCW"],
// 
// 0 !KEYWORDS Bathroom, Bricklink 3315stk01, Brickowl 604777, house, Olivia
// 0 !KEYWORDS Rebrickable 95460, set 3315
// 
// 0 !HISTORY 2024-12-01 [OrionP] Official Update 2024-10
// 
// 
// 1 16 0 -0.25 0 39 0 0 0 0.25 0 0 0 19 box5-12.dat
  [1,16,0,-0.25,0,39,0,0,0,0.25,0,0,0,19, ldraw_lib__box5_12()],
// 
// 4 383 39 -0.25 19 -39 -0.25 19 -39 -0.25 -19 39 -0.25 -19
  [4,383,39,-0.25,19,-39,-0.25,19,-39,-0.25,-19,39,-0.25,-19],
];
module ldraw_lib__4620860l(step=0, col=false, unit=2/5, alt=false, line=0.2, solid=!$preview)
    makepoly(ldraw_lib__4620860l(), step=step, col=col, unit=unit, alt=alt, line=line, solid=solid);
ldraw_lib__4620860l(line=0.2);
// main file
use <../lib.scad>
use <4620860l.scad>
use <87079.scad>
function ldraw_lib__87079d0e() = [
// 0 Tile  2 x  4 with Chrome Silver Mirror Sticker
// 0 Name: 87079d0e.dat
// 0 Author: Takeshi Takahashi [RainbowDolphin]
// 0 !LDRAW_ORG Shortcut UPDATE 2024-10
// 0 !LICENSE Licensed under CC BY 4.0 : see CAreadme.txt
// 
// 0 BFC CERTIFY CCW
  [0,"BFC","CERTIFY"],
  [0,"BFC","CCW"],
// 
// 0 !CATEGORY Sticker Shortcut
// 0 !KEYWORDS Bricklink 87079pb0125, Friends, house, Olivia, set 3315
// 
// 0 !HISTORY 2024-12-01 [OrionP] Official Update 2024-10
// 
// 1 16 0 0 0 1 0 0 0 1 0 0 0 1 87079.dat
  [1,16,0,0,0,1,0,0,0,1,0,0,0,1, ldraw_lib__87079()],
// 1 16 0 0 0 1 0 0 0 1 0 0 0 1 4620860l.dat
  [1,16,0,0,0,1,0,0,0,1,0,0,0,1, ldraw_lib__4620860l()],
];
module ldraw_lib__87079d0e(step=0, col=false, unit=2/5, alt=false, line=0.2, solid=!$preview)
    makepoly(ldraw_lib__87079d0e(), step=step, col=col, unit=unit, alt=alt, line=line, solid=solid);
ldraw_lib__87079d0e(line=0.2);
